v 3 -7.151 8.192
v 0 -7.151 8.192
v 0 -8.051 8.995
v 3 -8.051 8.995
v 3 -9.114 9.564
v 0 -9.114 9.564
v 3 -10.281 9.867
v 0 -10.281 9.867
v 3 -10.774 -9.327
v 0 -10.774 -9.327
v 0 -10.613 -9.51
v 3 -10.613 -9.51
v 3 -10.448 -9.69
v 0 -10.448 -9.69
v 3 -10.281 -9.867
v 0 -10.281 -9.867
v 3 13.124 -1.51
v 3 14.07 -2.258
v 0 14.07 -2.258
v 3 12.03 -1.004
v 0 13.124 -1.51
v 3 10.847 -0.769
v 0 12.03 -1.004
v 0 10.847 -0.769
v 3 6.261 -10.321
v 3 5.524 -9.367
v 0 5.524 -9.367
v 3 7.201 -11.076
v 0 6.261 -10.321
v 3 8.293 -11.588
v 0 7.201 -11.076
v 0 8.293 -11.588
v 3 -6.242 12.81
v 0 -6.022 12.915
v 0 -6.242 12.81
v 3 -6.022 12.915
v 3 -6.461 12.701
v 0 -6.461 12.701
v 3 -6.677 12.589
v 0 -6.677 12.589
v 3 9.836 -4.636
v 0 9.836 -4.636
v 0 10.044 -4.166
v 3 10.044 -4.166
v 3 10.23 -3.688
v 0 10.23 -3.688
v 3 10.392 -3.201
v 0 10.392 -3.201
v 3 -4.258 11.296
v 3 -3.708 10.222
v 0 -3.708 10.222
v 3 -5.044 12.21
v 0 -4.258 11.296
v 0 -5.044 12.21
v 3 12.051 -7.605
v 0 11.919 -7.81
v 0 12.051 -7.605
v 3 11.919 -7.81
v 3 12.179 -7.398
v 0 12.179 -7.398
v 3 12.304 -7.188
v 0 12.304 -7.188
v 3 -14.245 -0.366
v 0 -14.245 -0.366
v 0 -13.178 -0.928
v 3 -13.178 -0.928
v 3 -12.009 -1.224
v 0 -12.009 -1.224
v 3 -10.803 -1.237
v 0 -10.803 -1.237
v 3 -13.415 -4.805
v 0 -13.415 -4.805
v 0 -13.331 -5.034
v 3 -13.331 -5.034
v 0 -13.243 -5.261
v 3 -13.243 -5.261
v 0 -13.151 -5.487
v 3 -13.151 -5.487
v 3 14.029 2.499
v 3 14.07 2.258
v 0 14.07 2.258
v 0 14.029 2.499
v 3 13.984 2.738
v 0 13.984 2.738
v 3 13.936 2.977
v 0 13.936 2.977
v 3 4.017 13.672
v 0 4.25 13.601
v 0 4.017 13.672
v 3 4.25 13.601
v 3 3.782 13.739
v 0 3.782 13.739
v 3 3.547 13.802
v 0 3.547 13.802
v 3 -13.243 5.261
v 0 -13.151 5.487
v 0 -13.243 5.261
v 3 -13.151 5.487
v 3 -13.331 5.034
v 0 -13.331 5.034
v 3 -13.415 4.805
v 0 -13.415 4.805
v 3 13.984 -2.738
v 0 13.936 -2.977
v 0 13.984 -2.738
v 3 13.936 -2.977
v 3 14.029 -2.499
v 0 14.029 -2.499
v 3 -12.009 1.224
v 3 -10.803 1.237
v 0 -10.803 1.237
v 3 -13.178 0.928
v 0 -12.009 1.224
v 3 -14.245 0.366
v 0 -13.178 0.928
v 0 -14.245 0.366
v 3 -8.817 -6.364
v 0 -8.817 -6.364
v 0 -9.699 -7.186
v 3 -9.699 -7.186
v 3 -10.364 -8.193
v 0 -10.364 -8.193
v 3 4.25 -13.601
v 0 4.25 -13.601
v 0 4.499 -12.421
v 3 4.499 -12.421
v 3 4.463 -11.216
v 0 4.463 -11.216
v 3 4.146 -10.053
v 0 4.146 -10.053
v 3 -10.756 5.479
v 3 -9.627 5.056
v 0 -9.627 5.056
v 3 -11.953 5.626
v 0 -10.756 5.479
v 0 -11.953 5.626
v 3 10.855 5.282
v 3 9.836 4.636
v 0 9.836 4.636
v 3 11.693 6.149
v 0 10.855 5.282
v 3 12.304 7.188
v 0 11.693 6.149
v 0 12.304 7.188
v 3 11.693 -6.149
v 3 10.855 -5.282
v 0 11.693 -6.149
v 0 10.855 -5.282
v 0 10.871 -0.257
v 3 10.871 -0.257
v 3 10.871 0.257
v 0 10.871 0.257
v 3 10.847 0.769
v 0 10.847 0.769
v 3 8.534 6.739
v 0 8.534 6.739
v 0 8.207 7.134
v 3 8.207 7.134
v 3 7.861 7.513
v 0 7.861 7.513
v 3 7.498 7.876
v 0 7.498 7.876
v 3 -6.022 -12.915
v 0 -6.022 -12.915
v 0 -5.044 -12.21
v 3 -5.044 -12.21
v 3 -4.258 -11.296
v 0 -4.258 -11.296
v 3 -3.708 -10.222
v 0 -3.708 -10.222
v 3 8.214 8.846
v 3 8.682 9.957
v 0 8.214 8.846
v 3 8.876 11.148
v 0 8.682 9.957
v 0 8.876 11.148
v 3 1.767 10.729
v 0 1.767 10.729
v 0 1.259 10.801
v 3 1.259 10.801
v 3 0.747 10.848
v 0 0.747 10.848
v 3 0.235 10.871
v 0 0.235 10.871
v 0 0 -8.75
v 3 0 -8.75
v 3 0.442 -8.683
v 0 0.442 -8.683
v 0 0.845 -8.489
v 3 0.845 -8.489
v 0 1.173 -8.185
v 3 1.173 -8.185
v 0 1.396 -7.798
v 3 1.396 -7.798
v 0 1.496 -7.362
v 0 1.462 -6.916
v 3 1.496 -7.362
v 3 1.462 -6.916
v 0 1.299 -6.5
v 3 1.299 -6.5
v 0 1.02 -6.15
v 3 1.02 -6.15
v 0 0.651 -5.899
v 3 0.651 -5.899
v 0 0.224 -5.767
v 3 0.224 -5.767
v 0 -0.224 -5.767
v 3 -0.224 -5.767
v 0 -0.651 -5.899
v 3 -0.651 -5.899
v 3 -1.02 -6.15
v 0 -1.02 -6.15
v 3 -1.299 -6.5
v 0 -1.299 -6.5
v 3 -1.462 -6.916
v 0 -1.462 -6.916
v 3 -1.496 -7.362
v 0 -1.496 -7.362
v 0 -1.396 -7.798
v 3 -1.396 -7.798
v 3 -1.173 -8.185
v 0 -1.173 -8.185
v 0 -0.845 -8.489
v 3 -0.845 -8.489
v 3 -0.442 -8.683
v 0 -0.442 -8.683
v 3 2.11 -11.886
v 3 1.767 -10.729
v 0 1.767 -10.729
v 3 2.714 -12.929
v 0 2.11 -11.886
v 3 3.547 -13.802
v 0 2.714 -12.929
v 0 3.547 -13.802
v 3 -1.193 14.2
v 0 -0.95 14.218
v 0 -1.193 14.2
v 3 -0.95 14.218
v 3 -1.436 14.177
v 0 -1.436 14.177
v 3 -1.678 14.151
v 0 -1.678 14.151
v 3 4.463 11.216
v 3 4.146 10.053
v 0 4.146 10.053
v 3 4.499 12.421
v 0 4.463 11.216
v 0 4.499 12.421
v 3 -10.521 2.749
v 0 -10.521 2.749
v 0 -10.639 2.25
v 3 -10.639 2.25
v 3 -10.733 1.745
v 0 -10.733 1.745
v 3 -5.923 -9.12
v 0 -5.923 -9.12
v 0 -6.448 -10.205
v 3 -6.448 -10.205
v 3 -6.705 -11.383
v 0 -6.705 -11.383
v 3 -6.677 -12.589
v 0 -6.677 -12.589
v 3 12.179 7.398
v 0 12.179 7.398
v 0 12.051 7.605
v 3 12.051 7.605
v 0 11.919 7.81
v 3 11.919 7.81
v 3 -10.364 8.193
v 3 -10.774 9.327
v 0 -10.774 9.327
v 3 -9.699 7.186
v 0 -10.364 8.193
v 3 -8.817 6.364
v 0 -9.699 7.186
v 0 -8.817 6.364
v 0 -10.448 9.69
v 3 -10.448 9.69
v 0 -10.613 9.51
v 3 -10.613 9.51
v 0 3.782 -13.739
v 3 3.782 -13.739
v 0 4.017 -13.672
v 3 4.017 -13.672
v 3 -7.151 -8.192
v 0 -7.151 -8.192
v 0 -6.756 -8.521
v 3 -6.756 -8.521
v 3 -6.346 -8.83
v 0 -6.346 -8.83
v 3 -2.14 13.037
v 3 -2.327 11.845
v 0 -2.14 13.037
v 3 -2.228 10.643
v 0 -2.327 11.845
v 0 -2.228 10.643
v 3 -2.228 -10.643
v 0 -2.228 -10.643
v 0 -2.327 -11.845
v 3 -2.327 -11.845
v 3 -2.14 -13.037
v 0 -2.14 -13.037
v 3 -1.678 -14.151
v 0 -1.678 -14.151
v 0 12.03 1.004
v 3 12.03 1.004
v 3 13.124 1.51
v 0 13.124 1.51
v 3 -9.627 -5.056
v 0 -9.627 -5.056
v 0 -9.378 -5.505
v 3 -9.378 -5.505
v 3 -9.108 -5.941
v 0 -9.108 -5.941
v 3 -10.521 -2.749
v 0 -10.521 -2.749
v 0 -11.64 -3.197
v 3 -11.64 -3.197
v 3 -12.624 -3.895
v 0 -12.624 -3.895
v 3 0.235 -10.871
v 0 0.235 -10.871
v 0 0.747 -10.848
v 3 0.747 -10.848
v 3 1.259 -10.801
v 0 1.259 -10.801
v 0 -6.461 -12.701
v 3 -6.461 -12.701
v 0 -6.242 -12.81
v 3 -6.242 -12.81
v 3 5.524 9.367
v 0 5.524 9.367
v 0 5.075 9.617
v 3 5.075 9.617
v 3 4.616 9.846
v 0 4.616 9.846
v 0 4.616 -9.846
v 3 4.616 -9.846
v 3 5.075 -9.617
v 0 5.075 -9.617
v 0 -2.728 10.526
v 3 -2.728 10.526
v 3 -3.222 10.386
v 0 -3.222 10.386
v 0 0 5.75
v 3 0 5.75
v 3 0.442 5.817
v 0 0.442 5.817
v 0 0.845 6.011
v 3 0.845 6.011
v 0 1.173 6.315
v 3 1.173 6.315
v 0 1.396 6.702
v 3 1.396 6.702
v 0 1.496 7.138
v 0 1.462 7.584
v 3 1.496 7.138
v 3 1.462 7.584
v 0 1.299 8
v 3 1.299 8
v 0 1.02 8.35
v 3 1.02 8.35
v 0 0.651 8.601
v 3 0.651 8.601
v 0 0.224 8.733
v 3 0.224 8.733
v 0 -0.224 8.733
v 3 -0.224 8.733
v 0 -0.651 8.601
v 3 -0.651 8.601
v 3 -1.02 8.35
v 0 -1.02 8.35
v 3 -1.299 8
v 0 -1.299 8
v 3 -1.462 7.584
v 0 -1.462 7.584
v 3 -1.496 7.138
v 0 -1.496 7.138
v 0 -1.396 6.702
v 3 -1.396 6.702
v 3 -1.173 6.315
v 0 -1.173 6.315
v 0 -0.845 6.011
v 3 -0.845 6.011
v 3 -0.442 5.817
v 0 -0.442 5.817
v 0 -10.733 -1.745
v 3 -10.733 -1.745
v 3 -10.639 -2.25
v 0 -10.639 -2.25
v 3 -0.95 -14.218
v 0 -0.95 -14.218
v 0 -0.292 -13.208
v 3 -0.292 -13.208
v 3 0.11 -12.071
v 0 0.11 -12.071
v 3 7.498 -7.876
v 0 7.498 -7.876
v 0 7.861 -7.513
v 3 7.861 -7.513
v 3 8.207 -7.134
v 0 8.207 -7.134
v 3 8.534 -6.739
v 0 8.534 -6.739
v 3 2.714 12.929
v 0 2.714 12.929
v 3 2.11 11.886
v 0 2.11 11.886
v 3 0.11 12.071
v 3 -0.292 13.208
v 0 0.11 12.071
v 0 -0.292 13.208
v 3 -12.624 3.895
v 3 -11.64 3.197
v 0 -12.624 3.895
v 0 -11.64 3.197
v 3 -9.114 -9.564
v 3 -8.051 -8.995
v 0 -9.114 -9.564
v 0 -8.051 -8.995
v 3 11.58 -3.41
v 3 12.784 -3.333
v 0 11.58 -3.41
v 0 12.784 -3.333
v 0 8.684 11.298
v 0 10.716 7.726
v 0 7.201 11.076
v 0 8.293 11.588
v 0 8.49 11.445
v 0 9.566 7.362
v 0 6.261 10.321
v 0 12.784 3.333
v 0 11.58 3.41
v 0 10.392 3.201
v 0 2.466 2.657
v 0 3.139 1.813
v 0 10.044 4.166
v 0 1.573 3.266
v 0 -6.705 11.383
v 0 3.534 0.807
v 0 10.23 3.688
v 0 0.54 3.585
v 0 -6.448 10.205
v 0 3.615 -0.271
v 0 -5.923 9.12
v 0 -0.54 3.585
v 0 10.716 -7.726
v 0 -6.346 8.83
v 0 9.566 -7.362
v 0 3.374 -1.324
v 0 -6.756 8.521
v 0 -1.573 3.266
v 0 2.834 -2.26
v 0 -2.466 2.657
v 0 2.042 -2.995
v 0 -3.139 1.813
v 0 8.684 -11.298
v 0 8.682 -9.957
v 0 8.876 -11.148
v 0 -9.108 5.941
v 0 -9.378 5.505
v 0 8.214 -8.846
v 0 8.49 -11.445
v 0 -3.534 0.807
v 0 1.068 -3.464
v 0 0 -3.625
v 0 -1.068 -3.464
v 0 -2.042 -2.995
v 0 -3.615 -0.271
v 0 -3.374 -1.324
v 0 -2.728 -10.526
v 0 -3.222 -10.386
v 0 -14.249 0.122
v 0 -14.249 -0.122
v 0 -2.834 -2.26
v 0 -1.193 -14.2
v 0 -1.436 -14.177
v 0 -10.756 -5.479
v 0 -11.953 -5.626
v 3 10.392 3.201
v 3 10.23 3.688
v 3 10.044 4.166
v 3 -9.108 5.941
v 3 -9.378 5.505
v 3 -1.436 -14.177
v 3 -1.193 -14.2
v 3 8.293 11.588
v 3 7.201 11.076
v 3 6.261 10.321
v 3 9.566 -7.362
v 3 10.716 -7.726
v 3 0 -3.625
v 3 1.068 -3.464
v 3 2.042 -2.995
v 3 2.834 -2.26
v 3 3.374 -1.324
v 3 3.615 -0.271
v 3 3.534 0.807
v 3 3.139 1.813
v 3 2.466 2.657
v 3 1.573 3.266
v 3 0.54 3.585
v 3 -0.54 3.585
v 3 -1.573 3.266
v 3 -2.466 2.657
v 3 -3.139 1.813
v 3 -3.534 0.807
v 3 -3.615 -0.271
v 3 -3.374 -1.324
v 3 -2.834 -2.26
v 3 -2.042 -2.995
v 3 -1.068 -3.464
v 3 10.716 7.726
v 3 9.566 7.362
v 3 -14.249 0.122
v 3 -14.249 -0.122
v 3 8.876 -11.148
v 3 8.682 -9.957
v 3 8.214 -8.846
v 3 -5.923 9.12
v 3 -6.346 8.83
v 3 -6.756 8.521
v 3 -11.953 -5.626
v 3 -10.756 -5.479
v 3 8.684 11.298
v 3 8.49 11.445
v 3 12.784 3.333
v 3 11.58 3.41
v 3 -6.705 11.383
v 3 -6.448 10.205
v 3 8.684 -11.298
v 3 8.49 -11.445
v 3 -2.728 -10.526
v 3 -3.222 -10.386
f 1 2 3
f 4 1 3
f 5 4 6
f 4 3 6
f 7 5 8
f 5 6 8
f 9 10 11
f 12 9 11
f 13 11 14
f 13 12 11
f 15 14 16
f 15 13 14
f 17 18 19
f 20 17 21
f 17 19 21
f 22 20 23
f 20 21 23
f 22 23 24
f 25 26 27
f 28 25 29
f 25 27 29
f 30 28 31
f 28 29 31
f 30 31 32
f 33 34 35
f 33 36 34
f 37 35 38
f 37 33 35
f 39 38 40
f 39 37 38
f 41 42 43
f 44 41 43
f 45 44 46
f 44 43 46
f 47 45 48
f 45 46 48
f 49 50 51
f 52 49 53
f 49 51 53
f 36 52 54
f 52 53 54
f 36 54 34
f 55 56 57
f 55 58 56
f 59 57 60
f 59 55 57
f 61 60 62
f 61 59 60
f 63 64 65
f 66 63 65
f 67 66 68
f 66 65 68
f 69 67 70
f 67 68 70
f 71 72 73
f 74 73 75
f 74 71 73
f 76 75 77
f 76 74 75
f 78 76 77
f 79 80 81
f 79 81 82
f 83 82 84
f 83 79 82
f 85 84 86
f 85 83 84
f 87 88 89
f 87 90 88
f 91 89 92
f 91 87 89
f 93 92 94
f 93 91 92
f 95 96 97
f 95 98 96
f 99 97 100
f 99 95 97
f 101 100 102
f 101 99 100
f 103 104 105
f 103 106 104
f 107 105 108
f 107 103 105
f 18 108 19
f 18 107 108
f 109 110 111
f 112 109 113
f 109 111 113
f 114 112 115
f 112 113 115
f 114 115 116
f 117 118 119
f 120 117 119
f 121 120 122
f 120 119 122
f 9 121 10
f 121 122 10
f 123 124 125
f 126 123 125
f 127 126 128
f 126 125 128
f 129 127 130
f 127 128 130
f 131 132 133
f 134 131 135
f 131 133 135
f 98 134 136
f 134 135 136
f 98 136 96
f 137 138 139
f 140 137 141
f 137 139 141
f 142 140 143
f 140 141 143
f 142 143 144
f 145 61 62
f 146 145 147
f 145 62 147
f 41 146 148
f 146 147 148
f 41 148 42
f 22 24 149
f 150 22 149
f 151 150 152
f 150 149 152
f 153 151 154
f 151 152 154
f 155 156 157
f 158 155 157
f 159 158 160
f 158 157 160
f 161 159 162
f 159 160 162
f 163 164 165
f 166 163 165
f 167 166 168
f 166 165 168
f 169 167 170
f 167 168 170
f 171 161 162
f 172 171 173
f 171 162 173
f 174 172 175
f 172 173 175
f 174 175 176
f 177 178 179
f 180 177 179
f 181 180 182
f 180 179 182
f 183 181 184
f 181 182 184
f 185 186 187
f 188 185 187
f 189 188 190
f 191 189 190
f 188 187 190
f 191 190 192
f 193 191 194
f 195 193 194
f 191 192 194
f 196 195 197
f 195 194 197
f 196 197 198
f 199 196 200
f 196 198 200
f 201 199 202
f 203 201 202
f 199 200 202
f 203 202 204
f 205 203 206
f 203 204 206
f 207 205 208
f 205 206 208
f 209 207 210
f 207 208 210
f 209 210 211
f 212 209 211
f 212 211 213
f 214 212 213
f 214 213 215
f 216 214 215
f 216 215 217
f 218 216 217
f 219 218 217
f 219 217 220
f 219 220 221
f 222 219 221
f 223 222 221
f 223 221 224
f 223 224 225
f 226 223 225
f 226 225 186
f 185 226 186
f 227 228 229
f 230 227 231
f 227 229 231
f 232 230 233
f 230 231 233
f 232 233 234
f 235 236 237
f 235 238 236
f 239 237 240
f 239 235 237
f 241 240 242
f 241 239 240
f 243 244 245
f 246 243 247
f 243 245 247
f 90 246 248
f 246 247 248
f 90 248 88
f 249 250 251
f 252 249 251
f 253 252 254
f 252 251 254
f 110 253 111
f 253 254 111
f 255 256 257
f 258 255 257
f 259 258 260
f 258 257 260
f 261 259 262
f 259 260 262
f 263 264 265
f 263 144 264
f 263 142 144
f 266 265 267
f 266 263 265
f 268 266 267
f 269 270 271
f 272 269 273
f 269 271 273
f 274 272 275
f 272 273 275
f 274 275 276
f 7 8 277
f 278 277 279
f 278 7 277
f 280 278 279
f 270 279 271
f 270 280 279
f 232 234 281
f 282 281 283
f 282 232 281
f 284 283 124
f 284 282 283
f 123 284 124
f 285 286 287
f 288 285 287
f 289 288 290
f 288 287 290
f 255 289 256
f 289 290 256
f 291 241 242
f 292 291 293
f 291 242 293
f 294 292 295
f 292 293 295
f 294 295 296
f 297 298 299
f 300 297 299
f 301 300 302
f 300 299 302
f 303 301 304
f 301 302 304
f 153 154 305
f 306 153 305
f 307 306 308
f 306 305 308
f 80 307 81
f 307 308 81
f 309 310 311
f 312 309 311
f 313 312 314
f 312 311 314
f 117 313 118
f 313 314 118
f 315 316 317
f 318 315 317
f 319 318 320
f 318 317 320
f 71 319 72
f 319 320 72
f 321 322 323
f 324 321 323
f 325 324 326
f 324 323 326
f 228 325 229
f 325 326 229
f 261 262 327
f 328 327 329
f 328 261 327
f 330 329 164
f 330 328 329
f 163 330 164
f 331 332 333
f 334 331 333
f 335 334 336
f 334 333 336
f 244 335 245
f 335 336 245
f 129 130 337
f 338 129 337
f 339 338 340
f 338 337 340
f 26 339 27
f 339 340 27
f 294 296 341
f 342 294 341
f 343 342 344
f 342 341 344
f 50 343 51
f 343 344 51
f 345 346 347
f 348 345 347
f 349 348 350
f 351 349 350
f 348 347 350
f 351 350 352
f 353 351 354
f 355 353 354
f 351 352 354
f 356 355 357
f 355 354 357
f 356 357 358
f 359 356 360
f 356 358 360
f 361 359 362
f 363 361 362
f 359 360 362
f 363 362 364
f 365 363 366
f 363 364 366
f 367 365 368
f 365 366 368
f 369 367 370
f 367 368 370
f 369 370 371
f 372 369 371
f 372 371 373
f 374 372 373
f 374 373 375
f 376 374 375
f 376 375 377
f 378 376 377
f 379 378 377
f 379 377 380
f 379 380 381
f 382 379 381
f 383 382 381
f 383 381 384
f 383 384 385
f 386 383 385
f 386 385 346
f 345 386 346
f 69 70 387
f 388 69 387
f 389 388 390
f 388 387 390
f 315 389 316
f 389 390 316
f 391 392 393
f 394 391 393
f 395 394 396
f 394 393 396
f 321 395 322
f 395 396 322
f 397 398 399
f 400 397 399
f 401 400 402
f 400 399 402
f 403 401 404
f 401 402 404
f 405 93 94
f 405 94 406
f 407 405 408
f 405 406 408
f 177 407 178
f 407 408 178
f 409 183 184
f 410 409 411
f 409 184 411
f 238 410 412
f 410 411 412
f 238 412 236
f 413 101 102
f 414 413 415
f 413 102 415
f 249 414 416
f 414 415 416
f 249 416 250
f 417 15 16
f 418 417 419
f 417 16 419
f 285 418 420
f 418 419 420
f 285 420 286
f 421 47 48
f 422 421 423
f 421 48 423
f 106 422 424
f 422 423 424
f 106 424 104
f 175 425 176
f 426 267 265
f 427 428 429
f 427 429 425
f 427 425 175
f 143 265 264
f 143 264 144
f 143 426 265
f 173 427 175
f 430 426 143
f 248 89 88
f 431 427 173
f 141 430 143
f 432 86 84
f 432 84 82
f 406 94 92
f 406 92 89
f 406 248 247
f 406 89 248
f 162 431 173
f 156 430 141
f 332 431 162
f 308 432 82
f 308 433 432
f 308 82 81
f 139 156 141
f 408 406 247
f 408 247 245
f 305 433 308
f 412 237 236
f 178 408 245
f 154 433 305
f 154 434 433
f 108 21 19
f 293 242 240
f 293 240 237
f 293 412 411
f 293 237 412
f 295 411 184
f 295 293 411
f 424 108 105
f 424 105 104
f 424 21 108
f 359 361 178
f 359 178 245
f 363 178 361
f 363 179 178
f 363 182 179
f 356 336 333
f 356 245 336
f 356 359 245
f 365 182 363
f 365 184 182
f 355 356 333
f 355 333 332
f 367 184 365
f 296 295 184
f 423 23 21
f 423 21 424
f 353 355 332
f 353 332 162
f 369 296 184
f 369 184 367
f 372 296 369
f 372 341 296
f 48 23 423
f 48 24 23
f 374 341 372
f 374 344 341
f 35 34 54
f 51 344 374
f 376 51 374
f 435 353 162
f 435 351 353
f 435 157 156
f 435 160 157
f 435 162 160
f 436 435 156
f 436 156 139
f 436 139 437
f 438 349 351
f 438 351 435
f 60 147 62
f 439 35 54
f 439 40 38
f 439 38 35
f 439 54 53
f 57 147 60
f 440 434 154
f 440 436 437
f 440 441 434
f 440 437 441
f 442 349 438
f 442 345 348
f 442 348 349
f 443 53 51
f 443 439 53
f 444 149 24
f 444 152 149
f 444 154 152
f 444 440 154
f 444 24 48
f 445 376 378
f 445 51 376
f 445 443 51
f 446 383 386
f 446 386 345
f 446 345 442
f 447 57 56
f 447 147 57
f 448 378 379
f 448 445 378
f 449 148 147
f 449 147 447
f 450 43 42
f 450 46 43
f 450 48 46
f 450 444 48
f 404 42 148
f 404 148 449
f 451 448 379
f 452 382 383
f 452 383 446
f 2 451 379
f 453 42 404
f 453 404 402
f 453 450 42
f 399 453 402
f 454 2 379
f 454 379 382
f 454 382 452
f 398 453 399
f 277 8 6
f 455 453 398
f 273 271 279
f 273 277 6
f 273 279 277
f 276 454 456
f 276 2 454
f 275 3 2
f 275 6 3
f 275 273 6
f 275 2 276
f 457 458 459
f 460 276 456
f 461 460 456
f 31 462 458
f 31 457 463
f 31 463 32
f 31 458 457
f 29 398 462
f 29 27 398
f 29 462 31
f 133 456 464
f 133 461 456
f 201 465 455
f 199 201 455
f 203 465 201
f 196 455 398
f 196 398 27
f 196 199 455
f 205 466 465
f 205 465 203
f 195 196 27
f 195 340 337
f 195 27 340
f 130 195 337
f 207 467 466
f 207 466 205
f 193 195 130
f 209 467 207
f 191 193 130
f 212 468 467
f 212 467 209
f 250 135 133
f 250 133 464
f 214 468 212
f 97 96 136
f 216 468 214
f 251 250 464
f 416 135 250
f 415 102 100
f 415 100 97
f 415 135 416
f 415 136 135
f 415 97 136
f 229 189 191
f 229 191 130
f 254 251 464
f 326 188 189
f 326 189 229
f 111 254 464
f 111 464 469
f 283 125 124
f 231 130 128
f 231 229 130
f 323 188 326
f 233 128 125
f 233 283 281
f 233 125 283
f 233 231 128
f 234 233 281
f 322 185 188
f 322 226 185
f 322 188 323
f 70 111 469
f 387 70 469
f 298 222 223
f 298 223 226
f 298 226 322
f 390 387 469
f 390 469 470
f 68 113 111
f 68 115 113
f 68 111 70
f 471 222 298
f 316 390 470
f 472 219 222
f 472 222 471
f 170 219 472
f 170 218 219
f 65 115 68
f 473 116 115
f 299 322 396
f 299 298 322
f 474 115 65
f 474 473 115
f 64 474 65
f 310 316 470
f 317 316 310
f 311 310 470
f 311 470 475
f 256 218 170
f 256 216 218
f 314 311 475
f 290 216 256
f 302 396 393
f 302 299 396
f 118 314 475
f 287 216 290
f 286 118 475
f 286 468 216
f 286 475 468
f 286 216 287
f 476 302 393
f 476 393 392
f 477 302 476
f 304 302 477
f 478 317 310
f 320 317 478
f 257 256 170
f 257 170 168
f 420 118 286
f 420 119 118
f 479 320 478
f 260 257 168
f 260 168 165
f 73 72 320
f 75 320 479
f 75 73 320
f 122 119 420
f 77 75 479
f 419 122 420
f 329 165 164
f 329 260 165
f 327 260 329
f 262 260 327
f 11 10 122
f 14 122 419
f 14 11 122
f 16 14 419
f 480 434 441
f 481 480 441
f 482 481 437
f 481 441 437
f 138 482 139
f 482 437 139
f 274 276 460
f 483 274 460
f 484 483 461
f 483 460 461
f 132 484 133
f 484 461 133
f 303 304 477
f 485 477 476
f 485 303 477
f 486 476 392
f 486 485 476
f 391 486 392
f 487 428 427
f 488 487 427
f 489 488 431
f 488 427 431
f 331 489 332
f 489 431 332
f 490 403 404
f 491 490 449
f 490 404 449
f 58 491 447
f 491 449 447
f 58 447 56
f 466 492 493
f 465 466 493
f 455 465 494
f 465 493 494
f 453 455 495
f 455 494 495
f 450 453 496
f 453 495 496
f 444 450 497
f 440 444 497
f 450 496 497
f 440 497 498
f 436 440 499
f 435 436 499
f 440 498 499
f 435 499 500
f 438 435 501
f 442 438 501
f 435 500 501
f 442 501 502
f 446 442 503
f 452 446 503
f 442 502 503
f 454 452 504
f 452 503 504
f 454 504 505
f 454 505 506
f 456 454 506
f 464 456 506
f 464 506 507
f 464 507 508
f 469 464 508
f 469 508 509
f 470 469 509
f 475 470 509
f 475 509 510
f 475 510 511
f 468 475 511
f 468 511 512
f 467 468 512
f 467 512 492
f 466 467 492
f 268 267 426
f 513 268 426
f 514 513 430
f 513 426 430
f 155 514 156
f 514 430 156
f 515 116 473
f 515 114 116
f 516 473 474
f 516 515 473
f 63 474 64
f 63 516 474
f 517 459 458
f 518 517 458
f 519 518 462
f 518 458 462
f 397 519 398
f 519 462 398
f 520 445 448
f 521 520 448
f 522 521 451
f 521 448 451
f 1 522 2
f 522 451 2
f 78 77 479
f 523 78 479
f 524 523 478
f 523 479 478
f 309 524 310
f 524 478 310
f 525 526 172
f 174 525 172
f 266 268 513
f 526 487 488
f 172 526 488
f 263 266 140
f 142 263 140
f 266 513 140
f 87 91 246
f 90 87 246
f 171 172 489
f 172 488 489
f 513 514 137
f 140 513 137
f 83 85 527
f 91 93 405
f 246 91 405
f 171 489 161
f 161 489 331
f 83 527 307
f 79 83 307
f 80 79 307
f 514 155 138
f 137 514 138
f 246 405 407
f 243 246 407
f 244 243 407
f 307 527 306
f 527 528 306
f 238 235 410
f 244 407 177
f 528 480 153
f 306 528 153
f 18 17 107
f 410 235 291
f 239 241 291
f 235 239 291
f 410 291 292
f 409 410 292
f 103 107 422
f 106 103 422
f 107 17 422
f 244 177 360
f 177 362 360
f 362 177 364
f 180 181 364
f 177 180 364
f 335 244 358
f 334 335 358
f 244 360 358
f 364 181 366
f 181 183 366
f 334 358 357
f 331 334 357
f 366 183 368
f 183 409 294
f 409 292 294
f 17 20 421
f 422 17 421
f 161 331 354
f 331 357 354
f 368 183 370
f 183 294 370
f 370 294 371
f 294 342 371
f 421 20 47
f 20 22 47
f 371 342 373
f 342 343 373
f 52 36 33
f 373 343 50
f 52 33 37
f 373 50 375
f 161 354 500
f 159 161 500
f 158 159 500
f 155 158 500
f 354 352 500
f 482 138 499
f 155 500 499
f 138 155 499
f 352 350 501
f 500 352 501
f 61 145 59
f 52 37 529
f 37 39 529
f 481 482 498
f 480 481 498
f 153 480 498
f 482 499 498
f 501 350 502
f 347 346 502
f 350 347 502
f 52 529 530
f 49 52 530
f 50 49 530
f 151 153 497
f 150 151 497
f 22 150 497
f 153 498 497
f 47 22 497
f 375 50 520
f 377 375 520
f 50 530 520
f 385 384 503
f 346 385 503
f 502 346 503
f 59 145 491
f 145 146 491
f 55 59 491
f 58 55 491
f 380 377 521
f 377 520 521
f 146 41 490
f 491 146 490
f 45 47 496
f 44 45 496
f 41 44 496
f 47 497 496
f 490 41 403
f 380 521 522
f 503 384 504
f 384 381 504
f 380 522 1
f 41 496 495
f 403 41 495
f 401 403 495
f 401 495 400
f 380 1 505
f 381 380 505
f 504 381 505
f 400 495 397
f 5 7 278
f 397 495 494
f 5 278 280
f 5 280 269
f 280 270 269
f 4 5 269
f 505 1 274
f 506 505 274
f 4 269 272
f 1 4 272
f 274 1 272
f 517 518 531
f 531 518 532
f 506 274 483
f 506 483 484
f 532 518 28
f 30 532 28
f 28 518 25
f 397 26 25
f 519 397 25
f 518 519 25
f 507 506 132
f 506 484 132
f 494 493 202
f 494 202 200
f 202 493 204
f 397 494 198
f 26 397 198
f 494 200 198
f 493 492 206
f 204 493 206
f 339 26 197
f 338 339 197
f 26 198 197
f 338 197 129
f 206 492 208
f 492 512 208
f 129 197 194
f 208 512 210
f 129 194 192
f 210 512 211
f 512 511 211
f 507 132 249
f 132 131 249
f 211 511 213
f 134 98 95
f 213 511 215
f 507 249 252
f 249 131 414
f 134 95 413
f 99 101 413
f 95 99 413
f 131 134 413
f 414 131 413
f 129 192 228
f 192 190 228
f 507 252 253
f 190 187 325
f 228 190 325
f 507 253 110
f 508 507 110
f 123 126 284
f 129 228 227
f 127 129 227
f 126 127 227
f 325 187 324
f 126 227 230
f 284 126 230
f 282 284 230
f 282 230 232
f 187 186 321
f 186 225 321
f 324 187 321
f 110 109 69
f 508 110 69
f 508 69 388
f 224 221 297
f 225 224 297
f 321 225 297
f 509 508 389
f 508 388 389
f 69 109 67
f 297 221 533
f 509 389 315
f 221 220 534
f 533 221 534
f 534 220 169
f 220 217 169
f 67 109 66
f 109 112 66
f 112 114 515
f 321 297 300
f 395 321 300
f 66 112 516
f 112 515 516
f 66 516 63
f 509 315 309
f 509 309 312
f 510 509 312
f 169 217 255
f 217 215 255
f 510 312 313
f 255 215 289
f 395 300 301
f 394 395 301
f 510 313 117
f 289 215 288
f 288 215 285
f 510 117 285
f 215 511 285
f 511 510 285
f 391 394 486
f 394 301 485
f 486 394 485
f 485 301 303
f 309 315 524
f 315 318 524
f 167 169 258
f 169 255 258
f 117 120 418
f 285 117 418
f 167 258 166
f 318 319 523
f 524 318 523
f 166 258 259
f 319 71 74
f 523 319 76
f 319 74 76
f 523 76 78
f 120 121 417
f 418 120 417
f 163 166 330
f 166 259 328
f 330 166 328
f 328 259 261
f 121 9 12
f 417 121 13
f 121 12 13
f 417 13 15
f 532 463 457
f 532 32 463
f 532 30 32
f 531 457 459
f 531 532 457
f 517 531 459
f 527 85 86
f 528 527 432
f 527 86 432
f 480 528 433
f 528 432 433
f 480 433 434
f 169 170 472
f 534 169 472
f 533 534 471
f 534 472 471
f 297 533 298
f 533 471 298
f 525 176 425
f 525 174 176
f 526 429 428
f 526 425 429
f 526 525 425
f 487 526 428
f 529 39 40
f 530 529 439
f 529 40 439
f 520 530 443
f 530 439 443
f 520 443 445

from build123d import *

# Parameters (mm, degrees)
BASPROSKE_W           = 3
BASPROSKE_H           = 14.25
TOOTHCUT_DEPTH        = 21.374616561
TEETHCUTS_COUNT       = 17
TEETHCUTS_ANGLE       = 338.823529412
BORSKE_R              = 2.5
BORE_DEPTH            = 50.0000508
CROQUIS1_R            = 1.5
CROQUIS1_R_2          = 3.625
CORTAR_EXTRUIR1_DEPTH = 10


with BuildPart() as part:
    # BasProSke → Base-Revolve (revolve)
    with BuildSketch(Plane(origin=(0, 0, 0), x_dir=(1, 0, 0), z_dir=(0, 1, 0)), mode=Mode.PRIVATE) as base_revolve_sk:
        with Locations((1.5, 7.125)):
            Rectangle(BASPROSKE_W, BASPROSKE_H)
    revolve(base_revolve_sk.sketch.rotate(Axis((-10, 0, 0), (1, 0, 0)), 180), axis=Axis((-10, 0, 0), (1, 0, 0)))

    # TooCutSke → ToothCut (cut, through all)
    with BuildSketch(Plane(origin=(0, 0, 0), x_dir=(0, 0, -1), z_dir=(1, 0, 0))):
        with BuildLine():
            ThreePointArc((0.769354207, 10.846749287), (0, 10.874), (-0.769354207, 10.846749287))
            ThreePointArc((-0.769354207, 10.846749287), (-1.230849554, 12.606357238), (-2.280560064, 14.092057726))
            ThreePointArc((-2.280560064, 14.092057726), (0, 14.2754), (2.280560064, 14.092057726))
            ThreePointArc((2.280560064, 14.092057726), (1.230849554, 12.606357238), (0.769354207, 10.846749287))
        make_face()
    toothcut = extrude(amount=TOOTHCUT_DEPTH, mode=Mode.SUBTRACT)

    # TeethCuts: ToothCut ×17 about axis
    teethcuts_axis = Axis((-10, 0, 0), (1, 0, 0))
    for i in range(1, TEETHCUTS_COUNT):
        add(toothcut.rotate(teethcuts_axis, i * TEETHCUTS_ANGLE / (TEETHCUTS_COUNT - 1)), mode=Mode.SUBTRACT)

    # BorSke → Bore (cut, symmetric)
    with BuildSketch(Plane(origin=(0, 0, 0), x_dir=(0, 0, -1), z_dir=(1, 0, 0))):
        with Locations(Location((0, 0, 0), (0, 0, 180))):
            Circle(BORSKE_R)
    extrude(amount=BORE_DEPTH, both=True, mode=Mode.SUBTRACT)

    # Croquis1 → Cortar-Extruir1 (cut)
    with BuildSketch(Plane(origin=(3, 0, 0), x_dir=(0, 0, -1), z_dir=(1, 0, 0))):
        with Locations((7.25, 0)):
            Circle(CROQUIS1_R)
        Circle(CROQUIS1_R_2)
        with Locations((-7.25, 0)):
            Circle(CROQUIS1_R)
    extrude(amount=-CORTAR_EXTRUIR1_DEPTH, mode=Mode.SUBTRACT)


solid = part.part
